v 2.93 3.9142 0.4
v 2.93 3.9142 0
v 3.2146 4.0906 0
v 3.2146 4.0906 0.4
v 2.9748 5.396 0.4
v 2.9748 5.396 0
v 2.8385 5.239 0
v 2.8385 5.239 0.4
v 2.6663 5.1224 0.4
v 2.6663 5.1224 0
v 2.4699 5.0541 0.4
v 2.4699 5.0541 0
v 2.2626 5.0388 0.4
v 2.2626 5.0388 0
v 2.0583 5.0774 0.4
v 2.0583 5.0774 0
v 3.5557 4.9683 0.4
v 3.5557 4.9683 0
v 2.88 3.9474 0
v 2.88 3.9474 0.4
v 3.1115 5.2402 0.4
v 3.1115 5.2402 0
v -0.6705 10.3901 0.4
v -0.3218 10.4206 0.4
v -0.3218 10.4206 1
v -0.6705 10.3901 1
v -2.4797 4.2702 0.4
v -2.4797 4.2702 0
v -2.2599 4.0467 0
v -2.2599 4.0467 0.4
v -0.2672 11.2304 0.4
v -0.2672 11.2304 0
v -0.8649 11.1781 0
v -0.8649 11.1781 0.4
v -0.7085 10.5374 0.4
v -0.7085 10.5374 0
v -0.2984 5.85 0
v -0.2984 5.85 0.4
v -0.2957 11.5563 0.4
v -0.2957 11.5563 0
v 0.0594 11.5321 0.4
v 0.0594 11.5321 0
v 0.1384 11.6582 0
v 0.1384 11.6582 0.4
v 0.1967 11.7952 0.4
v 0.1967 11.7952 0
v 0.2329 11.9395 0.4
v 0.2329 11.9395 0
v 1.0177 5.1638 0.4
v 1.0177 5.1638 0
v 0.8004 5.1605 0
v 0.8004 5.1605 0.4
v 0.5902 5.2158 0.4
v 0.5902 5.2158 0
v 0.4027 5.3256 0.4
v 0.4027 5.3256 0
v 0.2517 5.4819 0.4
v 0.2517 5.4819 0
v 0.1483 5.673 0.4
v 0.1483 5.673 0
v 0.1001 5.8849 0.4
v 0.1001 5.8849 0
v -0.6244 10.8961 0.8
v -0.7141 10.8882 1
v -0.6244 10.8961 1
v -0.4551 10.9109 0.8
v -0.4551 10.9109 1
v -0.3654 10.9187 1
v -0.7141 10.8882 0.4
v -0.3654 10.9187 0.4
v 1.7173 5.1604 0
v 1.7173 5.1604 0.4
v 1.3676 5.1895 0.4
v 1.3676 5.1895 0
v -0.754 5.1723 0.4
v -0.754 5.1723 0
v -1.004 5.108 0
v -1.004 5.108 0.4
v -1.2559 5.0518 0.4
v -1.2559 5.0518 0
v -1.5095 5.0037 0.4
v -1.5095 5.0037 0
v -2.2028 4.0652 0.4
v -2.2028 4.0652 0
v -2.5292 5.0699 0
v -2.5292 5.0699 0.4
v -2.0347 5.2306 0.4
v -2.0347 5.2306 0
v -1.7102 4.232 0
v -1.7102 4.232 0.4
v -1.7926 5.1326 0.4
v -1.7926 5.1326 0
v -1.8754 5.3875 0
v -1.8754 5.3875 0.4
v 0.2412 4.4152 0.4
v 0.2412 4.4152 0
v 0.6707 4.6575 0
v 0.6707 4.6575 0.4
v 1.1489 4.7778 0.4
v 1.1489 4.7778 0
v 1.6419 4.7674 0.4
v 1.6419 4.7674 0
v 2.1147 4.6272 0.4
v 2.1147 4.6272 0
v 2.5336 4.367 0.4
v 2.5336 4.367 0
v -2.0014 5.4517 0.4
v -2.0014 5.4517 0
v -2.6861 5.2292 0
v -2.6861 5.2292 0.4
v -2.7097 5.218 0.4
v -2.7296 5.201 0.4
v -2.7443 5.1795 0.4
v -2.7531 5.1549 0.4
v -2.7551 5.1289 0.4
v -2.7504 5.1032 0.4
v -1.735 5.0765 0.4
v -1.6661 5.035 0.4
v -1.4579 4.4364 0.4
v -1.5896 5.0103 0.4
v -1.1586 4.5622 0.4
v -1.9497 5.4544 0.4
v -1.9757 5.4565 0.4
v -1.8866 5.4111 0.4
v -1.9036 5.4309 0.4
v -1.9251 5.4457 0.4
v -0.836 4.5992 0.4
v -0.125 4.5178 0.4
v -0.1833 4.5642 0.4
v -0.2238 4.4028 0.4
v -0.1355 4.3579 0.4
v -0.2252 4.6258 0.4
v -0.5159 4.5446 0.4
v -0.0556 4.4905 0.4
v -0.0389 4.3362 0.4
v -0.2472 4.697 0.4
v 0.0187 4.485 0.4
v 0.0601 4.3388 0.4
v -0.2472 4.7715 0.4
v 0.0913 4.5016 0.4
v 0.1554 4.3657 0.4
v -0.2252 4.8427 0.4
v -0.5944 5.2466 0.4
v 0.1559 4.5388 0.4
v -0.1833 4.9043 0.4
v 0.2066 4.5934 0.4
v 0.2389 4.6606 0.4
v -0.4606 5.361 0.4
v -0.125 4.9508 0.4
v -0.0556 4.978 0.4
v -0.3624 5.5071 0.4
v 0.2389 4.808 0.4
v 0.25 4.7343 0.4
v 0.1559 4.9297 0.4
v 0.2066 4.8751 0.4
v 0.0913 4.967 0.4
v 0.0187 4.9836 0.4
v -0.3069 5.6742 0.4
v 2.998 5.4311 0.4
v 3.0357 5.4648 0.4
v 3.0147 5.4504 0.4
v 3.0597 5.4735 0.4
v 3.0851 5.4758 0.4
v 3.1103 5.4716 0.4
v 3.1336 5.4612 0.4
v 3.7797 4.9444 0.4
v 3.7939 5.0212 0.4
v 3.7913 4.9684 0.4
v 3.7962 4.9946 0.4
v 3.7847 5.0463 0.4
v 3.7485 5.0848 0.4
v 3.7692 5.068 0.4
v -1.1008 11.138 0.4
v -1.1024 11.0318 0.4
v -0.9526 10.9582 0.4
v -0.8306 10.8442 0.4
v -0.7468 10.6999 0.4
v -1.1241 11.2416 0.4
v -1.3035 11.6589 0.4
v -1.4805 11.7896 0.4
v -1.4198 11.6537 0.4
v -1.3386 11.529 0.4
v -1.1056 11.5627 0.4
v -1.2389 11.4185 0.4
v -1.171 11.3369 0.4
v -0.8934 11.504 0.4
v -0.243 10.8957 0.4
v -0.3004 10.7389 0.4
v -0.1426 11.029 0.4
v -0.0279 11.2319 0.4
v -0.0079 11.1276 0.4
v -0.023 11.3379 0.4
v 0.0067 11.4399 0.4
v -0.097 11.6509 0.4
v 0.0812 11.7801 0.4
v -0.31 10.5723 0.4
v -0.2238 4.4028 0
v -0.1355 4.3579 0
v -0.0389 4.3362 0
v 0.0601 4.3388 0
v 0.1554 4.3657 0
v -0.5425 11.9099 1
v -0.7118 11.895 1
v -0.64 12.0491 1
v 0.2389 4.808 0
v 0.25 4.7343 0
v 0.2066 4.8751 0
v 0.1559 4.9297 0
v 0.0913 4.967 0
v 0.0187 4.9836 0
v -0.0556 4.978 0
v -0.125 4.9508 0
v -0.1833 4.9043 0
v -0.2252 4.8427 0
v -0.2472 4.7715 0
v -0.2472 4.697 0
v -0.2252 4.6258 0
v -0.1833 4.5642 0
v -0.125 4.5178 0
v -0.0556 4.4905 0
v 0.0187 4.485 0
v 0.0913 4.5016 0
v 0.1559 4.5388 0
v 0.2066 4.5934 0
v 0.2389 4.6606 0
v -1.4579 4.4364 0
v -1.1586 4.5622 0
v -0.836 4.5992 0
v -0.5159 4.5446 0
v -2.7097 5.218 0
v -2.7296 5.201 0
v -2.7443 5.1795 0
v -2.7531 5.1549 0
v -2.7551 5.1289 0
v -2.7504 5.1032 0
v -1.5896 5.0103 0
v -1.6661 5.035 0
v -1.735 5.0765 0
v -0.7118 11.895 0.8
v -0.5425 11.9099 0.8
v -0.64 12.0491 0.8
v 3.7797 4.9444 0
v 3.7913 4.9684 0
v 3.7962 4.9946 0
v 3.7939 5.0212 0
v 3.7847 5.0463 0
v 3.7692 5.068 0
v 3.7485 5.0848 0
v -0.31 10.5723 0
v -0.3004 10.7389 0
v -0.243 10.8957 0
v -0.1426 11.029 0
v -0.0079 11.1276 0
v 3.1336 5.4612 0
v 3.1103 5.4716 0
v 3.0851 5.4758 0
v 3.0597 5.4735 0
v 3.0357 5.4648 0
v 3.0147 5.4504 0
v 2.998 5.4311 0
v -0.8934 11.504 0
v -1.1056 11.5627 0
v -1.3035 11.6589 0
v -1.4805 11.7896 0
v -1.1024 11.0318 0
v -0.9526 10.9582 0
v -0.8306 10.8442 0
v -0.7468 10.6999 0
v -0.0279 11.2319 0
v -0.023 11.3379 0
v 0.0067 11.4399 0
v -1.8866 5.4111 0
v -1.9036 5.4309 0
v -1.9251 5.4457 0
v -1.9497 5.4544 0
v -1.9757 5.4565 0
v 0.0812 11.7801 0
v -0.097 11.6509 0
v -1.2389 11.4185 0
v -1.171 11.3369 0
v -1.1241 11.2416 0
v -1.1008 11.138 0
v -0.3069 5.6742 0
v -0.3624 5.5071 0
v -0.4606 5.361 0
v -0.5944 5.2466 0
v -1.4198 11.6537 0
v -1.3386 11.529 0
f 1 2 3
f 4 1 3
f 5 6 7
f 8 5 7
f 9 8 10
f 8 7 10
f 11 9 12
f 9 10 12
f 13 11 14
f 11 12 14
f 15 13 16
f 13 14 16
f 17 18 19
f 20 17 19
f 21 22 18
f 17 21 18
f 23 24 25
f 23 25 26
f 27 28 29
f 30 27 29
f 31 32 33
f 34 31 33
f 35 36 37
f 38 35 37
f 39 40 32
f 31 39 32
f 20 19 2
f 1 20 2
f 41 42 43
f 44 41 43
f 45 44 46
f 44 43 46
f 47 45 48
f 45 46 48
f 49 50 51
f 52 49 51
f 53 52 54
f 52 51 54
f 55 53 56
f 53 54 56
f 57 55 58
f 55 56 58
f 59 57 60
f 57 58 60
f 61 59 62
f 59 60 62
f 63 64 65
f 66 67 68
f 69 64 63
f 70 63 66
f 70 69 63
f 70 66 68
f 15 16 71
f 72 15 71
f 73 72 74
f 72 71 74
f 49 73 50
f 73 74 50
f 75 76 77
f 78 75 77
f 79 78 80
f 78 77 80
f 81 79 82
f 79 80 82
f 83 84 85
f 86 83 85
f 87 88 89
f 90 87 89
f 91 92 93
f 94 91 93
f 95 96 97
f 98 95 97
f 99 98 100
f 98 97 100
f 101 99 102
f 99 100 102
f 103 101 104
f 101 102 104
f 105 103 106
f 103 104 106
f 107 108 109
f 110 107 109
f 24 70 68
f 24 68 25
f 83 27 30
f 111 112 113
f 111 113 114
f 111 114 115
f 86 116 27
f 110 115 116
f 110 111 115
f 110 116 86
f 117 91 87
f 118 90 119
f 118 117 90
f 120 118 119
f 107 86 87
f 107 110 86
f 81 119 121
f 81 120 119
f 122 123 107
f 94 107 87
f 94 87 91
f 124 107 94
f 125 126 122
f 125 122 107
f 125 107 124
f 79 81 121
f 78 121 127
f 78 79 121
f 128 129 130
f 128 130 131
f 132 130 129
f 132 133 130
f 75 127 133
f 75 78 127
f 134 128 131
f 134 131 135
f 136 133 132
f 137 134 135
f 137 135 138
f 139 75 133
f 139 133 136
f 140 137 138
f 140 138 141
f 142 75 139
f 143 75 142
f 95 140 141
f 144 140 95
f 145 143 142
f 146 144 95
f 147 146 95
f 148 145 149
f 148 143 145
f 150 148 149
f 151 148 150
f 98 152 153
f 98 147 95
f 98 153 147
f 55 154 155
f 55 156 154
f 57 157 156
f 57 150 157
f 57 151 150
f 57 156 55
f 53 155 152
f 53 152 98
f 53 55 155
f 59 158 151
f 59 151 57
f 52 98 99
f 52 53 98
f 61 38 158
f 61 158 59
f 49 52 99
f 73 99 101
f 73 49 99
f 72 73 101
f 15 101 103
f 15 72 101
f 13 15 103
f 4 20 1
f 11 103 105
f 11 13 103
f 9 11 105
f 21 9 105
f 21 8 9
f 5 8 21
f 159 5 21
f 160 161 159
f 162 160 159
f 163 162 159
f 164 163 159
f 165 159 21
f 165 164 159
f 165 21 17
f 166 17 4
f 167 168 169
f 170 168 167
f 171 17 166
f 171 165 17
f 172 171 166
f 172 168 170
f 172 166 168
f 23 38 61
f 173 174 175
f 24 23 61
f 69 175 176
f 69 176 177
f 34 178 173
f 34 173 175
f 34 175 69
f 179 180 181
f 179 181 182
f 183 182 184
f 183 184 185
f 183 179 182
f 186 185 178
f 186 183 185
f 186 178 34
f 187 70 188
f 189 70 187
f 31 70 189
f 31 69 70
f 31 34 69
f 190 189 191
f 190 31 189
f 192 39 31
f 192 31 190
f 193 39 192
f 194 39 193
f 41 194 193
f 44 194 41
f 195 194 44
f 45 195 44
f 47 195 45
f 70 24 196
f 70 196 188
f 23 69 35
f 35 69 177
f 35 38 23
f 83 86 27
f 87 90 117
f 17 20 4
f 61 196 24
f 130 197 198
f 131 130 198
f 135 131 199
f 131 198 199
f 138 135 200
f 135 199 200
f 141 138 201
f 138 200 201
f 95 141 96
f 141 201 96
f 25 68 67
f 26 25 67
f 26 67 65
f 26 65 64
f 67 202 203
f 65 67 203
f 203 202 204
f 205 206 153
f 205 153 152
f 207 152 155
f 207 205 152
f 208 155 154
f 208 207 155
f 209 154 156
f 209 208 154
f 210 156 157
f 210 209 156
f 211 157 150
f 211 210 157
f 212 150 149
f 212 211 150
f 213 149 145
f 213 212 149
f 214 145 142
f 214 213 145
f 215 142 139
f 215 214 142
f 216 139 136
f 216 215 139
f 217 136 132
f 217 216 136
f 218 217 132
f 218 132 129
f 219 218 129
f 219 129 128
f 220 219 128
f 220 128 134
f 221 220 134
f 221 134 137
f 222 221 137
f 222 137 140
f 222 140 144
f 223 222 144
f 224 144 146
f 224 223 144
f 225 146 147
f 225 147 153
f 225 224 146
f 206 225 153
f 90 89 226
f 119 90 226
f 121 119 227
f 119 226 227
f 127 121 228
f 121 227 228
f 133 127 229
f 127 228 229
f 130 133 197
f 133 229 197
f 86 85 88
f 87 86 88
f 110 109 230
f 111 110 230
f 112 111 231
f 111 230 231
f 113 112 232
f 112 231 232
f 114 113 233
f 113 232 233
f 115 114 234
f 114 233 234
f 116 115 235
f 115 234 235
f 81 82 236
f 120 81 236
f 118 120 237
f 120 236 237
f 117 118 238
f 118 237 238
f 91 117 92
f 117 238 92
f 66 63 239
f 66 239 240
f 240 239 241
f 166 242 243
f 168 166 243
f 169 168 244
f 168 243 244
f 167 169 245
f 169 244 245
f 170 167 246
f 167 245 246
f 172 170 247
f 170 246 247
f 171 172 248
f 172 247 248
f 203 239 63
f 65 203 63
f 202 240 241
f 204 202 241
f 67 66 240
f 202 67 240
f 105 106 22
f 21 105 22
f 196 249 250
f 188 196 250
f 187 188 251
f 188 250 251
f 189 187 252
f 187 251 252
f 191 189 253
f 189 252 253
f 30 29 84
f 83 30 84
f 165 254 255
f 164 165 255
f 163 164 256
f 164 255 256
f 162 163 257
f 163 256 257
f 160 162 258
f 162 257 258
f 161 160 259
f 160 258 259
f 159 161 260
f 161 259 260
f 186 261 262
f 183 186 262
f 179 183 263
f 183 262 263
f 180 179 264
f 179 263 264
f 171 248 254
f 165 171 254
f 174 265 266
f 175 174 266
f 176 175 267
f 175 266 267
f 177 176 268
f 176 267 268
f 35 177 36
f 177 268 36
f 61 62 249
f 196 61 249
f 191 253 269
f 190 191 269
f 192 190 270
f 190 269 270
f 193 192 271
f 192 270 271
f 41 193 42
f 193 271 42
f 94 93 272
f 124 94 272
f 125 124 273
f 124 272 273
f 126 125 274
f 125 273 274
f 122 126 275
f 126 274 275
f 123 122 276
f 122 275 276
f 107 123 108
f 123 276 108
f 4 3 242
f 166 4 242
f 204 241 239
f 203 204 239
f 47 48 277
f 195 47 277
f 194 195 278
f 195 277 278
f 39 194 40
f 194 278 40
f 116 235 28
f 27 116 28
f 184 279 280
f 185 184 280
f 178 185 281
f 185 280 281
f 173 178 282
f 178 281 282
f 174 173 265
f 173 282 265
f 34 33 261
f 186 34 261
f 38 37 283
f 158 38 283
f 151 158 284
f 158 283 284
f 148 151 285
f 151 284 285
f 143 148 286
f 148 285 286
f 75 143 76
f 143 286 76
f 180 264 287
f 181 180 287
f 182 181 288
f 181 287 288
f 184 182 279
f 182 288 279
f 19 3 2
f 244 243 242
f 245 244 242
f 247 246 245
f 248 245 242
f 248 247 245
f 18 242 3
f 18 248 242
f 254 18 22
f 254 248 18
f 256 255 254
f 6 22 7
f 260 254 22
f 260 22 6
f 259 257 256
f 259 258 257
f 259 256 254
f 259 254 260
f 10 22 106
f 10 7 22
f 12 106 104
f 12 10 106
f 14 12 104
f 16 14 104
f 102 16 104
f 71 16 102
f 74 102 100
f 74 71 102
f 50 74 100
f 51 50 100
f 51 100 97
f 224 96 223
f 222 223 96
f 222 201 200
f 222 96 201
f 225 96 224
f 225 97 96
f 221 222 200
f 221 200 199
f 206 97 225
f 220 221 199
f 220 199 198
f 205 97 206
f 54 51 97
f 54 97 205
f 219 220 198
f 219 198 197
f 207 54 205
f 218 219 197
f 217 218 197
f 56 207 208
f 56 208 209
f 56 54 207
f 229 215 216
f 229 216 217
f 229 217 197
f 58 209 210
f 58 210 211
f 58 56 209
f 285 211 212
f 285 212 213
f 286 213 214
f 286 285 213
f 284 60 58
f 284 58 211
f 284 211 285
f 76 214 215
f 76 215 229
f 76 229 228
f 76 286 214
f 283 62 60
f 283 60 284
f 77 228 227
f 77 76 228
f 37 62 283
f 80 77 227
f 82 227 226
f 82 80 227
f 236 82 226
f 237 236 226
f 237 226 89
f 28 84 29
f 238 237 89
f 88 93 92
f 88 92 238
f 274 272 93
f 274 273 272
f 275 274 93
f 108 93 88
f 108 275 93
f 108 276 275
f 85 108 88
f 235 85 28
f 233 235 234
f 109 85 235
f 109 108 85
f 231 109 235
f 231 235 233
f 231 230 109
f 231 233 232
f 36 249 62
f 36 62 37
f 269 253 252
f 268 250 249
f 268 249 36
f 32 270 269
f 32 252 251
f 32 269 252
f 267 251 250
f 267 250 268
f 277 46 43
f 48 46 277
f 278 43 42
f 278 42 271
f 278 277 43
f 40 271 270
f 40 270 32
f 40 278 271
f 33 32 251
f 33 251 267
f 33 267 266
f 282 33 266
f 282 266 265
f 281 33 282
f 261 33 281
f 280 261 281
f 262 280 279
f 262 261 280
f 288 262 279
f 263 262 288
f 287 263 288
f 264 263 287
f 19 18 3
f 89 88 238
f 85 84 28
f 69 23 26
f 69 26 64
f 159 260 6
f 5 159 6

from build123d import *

# Parameters (mm, degrees)
BOSS_EXTRUDE1_OUTLINE_R = 0.25
BOSS_EXTRUDE1_DEPTH     = 0.4
BOSS_EXTRUDE2_DEPTH     = 1
BOSS_EXTRUDE3_START     = 0.8
BOSS_EXTRUDE3_DEPTH     = 0.2


# Read off the part's stored shape, not the designer's step: Boss-Extrude1
with BuildPart() as part:
    # Boss-Extrude1 outline → Boss-Extrude1 (new body)
    with BuildSketch(Plane.XY):
        with BuildLine():
            ThreePointArc((0.232880573, 11.939538652), (-0.004933085, 11.711410613), (-0.295707305, 11.556336146))
            Line((-0.295707305, 11.556336146), (-0.267193244, 11.23041893))
            Line((-0.267193244, 11.23041893), (-0.864910062, 11.178125485))
            Line((-0.864910062, 11.178125485), (-0.893424124, 11.5040427))
            ThreePointArc((-0.893424124, 11.5040427), (-1.206709229, 11.606268825), (-1.480523981, 11.789635178))
            ThreePointArc((-1.480523981, 11.789635178), (-1.381646187, 11.58978807), (-1.238910718, 11.418492212))
            ThreePointArc((-1.238910718, 11.418492212), (-1.124081641, 11.241613378), (-1.102444702, 11.031842833))
            ThreePointArc((-1.102444702, 11.031842833), (-0.830623384, 10.84424284), (-0.708470889, 10.537388877))
            Line((-0.708470889, 10.537388877), (-0.298379869, 5.850027068))
            ThreePointArc((-0.298379869, 5.850027068), (-0.406499279, 5.430691492), (-0.75404158, 5.172338089))
            ThreePointArc((-0.75404158, 5.172338089), (-1.129720091, 5.078868092), (-1.509480558, 5.003681847))
            ThreePointArc((-1.509480558, 5.003681847), (-1.666132979, 5.034974657), (-1.792562668, 5.132620725))
            Line((-1.792562668, 5.132620725), (-1.875378571, 5.387501866))
            ThreePointArc((-1.875378571, 5.387501866), (-1.925085173, 5.445700819), (-2.001385922, 5.451705818))
            Line((-2.001385922, 5.451705818), (-2.686146614, 5.229213582))
            ThreePointArc((-2.686146614, 5.229213582), (-2.744345567, 5.179506981), (-2.750350566, 5.103206231))
            Line((-2.750350566, 5.103206231), (-2.479687932, 4.270192298))
            Line((-2.479687932, 4.270192298), (-2.259859524, 4.046679542))
            Line((-2.259859524, 4.046679542), (-2.202796133, 4.065220562))
            Line((-2.202796133, 4.065220562), (-2.529237563, 5.069903979))
            Line((-2.529237563, 5.069903979), (-2.034688175, 5.230592816))
            Line((-2.034688175, 5.230592816), (-1.710220331, 4.231983473))
            ThreePointArc((-1.710220331, 4.231983473), (-0.998592576, 4.592140334), (-0.223827126, 4.40275838))
            ThreePointArc((-0.223827126, 4.40275838), (0.010695557, 4.334415883), (0.241228985, 4.415198467))
            ThreePointArc((0.241228985, 4.415198467), (1.395767253, 4.789072574), (2.533587129, 4.367045296))
            Line((2.533587129, 4.367045296), (3.111517477, 5.240202804))
            Line((3.111517477, 5.240202804), (3.555740915, 4.968344082))
            Line((3.555740915, 4.968344082), (2.879966638, 3.947360522))
            Line((2.879966638, 3.947360522), (2.929999788, 3.914244302))
            Line((2.929999788, 3.914244302), (3.214623401, 4.09061153))
            Line((3.214623401, 4.09061153), (3.779706708, 4.944359277))
            ThreePointArc((3.779706708, 4.944359277), (3.793941313, 5.021225846), (3.748517476, 5.084847921))
            Line((3.748517476, 5.084847921), (3.133596604, 5.46117116))
            ThreePointArc((3.133596604, 5.46117116), (3.059724383, 5.473499401), (2.998008671, 5.431069912))
            Line((2.998008671, 5.431069912), (2.974770776, 5.395961283))
            ThreePointArc((2.974770776, 5.395961283), (2.570340353, 5.081865355), (2.058285642, 5.077371822))
            ThreePointArc((2.058285642, 5.077371822), (1.543060021, 5.181767476), (1.017672926, 5.163759347))
            ThreePointArc((1.017672926, 5.163759347), (0.40272096, 5.32561867), (0.10009801, 5.884889365))
            Line((0.10009801, 5.884889365), (-0.30999301, 10.572251175))
            ThreePointArc((-0.30999301, 10.572251175), (-0.242980918, 10.895654894), (-0.007865573, 11.127606098))
            ThreePointArc((-0.007865573, 11.127606098), (-0.022983621, 11.337946973), (0.059386258, 11.53207848))
            ThreePointArc((0.059386258, 11.53207848), (0.170208041, 11.725557722), (0.232880573, 11.939538652))
        make_face()
        with Locations((0, 4.734272207)):
            Circle(BOSS_EXTRUDE1_OUTLINE_R, mode=Mode.SUBTRACT)
    extrude(amount=BOSS_EXTRUDE1_DEPTH)

    # Sketch1<8> → Boss-Extrude2 (add)
    with BuildSketch(Plane.XY):
        Polygon((-0.365402387, 10.918740425), (-0.321824516, 10.420643076), (-0.67049266, 10.390138566), (-0.714070532, 10.888235915), align=None)
    extrude(amount=BOSS_EXTRUDE2_DEPTH)

    # Sketch1<9> → Boss-Extrude3 (add)
    with BuildSketch(Plane.XY.offset(BOSS_EXTRUDE3_START)):
        Polygon((-0.624413009, 10.896079932), (-0.45505991, 10.910896408), (-0.54245757, 11.909856226), (-0.639965564, 12.049112073), (-0.711810668, 11.895039749), align=None)
    extrude(amount=BOSS_EXTRUDE3_DEPTH)


solid = part.part
